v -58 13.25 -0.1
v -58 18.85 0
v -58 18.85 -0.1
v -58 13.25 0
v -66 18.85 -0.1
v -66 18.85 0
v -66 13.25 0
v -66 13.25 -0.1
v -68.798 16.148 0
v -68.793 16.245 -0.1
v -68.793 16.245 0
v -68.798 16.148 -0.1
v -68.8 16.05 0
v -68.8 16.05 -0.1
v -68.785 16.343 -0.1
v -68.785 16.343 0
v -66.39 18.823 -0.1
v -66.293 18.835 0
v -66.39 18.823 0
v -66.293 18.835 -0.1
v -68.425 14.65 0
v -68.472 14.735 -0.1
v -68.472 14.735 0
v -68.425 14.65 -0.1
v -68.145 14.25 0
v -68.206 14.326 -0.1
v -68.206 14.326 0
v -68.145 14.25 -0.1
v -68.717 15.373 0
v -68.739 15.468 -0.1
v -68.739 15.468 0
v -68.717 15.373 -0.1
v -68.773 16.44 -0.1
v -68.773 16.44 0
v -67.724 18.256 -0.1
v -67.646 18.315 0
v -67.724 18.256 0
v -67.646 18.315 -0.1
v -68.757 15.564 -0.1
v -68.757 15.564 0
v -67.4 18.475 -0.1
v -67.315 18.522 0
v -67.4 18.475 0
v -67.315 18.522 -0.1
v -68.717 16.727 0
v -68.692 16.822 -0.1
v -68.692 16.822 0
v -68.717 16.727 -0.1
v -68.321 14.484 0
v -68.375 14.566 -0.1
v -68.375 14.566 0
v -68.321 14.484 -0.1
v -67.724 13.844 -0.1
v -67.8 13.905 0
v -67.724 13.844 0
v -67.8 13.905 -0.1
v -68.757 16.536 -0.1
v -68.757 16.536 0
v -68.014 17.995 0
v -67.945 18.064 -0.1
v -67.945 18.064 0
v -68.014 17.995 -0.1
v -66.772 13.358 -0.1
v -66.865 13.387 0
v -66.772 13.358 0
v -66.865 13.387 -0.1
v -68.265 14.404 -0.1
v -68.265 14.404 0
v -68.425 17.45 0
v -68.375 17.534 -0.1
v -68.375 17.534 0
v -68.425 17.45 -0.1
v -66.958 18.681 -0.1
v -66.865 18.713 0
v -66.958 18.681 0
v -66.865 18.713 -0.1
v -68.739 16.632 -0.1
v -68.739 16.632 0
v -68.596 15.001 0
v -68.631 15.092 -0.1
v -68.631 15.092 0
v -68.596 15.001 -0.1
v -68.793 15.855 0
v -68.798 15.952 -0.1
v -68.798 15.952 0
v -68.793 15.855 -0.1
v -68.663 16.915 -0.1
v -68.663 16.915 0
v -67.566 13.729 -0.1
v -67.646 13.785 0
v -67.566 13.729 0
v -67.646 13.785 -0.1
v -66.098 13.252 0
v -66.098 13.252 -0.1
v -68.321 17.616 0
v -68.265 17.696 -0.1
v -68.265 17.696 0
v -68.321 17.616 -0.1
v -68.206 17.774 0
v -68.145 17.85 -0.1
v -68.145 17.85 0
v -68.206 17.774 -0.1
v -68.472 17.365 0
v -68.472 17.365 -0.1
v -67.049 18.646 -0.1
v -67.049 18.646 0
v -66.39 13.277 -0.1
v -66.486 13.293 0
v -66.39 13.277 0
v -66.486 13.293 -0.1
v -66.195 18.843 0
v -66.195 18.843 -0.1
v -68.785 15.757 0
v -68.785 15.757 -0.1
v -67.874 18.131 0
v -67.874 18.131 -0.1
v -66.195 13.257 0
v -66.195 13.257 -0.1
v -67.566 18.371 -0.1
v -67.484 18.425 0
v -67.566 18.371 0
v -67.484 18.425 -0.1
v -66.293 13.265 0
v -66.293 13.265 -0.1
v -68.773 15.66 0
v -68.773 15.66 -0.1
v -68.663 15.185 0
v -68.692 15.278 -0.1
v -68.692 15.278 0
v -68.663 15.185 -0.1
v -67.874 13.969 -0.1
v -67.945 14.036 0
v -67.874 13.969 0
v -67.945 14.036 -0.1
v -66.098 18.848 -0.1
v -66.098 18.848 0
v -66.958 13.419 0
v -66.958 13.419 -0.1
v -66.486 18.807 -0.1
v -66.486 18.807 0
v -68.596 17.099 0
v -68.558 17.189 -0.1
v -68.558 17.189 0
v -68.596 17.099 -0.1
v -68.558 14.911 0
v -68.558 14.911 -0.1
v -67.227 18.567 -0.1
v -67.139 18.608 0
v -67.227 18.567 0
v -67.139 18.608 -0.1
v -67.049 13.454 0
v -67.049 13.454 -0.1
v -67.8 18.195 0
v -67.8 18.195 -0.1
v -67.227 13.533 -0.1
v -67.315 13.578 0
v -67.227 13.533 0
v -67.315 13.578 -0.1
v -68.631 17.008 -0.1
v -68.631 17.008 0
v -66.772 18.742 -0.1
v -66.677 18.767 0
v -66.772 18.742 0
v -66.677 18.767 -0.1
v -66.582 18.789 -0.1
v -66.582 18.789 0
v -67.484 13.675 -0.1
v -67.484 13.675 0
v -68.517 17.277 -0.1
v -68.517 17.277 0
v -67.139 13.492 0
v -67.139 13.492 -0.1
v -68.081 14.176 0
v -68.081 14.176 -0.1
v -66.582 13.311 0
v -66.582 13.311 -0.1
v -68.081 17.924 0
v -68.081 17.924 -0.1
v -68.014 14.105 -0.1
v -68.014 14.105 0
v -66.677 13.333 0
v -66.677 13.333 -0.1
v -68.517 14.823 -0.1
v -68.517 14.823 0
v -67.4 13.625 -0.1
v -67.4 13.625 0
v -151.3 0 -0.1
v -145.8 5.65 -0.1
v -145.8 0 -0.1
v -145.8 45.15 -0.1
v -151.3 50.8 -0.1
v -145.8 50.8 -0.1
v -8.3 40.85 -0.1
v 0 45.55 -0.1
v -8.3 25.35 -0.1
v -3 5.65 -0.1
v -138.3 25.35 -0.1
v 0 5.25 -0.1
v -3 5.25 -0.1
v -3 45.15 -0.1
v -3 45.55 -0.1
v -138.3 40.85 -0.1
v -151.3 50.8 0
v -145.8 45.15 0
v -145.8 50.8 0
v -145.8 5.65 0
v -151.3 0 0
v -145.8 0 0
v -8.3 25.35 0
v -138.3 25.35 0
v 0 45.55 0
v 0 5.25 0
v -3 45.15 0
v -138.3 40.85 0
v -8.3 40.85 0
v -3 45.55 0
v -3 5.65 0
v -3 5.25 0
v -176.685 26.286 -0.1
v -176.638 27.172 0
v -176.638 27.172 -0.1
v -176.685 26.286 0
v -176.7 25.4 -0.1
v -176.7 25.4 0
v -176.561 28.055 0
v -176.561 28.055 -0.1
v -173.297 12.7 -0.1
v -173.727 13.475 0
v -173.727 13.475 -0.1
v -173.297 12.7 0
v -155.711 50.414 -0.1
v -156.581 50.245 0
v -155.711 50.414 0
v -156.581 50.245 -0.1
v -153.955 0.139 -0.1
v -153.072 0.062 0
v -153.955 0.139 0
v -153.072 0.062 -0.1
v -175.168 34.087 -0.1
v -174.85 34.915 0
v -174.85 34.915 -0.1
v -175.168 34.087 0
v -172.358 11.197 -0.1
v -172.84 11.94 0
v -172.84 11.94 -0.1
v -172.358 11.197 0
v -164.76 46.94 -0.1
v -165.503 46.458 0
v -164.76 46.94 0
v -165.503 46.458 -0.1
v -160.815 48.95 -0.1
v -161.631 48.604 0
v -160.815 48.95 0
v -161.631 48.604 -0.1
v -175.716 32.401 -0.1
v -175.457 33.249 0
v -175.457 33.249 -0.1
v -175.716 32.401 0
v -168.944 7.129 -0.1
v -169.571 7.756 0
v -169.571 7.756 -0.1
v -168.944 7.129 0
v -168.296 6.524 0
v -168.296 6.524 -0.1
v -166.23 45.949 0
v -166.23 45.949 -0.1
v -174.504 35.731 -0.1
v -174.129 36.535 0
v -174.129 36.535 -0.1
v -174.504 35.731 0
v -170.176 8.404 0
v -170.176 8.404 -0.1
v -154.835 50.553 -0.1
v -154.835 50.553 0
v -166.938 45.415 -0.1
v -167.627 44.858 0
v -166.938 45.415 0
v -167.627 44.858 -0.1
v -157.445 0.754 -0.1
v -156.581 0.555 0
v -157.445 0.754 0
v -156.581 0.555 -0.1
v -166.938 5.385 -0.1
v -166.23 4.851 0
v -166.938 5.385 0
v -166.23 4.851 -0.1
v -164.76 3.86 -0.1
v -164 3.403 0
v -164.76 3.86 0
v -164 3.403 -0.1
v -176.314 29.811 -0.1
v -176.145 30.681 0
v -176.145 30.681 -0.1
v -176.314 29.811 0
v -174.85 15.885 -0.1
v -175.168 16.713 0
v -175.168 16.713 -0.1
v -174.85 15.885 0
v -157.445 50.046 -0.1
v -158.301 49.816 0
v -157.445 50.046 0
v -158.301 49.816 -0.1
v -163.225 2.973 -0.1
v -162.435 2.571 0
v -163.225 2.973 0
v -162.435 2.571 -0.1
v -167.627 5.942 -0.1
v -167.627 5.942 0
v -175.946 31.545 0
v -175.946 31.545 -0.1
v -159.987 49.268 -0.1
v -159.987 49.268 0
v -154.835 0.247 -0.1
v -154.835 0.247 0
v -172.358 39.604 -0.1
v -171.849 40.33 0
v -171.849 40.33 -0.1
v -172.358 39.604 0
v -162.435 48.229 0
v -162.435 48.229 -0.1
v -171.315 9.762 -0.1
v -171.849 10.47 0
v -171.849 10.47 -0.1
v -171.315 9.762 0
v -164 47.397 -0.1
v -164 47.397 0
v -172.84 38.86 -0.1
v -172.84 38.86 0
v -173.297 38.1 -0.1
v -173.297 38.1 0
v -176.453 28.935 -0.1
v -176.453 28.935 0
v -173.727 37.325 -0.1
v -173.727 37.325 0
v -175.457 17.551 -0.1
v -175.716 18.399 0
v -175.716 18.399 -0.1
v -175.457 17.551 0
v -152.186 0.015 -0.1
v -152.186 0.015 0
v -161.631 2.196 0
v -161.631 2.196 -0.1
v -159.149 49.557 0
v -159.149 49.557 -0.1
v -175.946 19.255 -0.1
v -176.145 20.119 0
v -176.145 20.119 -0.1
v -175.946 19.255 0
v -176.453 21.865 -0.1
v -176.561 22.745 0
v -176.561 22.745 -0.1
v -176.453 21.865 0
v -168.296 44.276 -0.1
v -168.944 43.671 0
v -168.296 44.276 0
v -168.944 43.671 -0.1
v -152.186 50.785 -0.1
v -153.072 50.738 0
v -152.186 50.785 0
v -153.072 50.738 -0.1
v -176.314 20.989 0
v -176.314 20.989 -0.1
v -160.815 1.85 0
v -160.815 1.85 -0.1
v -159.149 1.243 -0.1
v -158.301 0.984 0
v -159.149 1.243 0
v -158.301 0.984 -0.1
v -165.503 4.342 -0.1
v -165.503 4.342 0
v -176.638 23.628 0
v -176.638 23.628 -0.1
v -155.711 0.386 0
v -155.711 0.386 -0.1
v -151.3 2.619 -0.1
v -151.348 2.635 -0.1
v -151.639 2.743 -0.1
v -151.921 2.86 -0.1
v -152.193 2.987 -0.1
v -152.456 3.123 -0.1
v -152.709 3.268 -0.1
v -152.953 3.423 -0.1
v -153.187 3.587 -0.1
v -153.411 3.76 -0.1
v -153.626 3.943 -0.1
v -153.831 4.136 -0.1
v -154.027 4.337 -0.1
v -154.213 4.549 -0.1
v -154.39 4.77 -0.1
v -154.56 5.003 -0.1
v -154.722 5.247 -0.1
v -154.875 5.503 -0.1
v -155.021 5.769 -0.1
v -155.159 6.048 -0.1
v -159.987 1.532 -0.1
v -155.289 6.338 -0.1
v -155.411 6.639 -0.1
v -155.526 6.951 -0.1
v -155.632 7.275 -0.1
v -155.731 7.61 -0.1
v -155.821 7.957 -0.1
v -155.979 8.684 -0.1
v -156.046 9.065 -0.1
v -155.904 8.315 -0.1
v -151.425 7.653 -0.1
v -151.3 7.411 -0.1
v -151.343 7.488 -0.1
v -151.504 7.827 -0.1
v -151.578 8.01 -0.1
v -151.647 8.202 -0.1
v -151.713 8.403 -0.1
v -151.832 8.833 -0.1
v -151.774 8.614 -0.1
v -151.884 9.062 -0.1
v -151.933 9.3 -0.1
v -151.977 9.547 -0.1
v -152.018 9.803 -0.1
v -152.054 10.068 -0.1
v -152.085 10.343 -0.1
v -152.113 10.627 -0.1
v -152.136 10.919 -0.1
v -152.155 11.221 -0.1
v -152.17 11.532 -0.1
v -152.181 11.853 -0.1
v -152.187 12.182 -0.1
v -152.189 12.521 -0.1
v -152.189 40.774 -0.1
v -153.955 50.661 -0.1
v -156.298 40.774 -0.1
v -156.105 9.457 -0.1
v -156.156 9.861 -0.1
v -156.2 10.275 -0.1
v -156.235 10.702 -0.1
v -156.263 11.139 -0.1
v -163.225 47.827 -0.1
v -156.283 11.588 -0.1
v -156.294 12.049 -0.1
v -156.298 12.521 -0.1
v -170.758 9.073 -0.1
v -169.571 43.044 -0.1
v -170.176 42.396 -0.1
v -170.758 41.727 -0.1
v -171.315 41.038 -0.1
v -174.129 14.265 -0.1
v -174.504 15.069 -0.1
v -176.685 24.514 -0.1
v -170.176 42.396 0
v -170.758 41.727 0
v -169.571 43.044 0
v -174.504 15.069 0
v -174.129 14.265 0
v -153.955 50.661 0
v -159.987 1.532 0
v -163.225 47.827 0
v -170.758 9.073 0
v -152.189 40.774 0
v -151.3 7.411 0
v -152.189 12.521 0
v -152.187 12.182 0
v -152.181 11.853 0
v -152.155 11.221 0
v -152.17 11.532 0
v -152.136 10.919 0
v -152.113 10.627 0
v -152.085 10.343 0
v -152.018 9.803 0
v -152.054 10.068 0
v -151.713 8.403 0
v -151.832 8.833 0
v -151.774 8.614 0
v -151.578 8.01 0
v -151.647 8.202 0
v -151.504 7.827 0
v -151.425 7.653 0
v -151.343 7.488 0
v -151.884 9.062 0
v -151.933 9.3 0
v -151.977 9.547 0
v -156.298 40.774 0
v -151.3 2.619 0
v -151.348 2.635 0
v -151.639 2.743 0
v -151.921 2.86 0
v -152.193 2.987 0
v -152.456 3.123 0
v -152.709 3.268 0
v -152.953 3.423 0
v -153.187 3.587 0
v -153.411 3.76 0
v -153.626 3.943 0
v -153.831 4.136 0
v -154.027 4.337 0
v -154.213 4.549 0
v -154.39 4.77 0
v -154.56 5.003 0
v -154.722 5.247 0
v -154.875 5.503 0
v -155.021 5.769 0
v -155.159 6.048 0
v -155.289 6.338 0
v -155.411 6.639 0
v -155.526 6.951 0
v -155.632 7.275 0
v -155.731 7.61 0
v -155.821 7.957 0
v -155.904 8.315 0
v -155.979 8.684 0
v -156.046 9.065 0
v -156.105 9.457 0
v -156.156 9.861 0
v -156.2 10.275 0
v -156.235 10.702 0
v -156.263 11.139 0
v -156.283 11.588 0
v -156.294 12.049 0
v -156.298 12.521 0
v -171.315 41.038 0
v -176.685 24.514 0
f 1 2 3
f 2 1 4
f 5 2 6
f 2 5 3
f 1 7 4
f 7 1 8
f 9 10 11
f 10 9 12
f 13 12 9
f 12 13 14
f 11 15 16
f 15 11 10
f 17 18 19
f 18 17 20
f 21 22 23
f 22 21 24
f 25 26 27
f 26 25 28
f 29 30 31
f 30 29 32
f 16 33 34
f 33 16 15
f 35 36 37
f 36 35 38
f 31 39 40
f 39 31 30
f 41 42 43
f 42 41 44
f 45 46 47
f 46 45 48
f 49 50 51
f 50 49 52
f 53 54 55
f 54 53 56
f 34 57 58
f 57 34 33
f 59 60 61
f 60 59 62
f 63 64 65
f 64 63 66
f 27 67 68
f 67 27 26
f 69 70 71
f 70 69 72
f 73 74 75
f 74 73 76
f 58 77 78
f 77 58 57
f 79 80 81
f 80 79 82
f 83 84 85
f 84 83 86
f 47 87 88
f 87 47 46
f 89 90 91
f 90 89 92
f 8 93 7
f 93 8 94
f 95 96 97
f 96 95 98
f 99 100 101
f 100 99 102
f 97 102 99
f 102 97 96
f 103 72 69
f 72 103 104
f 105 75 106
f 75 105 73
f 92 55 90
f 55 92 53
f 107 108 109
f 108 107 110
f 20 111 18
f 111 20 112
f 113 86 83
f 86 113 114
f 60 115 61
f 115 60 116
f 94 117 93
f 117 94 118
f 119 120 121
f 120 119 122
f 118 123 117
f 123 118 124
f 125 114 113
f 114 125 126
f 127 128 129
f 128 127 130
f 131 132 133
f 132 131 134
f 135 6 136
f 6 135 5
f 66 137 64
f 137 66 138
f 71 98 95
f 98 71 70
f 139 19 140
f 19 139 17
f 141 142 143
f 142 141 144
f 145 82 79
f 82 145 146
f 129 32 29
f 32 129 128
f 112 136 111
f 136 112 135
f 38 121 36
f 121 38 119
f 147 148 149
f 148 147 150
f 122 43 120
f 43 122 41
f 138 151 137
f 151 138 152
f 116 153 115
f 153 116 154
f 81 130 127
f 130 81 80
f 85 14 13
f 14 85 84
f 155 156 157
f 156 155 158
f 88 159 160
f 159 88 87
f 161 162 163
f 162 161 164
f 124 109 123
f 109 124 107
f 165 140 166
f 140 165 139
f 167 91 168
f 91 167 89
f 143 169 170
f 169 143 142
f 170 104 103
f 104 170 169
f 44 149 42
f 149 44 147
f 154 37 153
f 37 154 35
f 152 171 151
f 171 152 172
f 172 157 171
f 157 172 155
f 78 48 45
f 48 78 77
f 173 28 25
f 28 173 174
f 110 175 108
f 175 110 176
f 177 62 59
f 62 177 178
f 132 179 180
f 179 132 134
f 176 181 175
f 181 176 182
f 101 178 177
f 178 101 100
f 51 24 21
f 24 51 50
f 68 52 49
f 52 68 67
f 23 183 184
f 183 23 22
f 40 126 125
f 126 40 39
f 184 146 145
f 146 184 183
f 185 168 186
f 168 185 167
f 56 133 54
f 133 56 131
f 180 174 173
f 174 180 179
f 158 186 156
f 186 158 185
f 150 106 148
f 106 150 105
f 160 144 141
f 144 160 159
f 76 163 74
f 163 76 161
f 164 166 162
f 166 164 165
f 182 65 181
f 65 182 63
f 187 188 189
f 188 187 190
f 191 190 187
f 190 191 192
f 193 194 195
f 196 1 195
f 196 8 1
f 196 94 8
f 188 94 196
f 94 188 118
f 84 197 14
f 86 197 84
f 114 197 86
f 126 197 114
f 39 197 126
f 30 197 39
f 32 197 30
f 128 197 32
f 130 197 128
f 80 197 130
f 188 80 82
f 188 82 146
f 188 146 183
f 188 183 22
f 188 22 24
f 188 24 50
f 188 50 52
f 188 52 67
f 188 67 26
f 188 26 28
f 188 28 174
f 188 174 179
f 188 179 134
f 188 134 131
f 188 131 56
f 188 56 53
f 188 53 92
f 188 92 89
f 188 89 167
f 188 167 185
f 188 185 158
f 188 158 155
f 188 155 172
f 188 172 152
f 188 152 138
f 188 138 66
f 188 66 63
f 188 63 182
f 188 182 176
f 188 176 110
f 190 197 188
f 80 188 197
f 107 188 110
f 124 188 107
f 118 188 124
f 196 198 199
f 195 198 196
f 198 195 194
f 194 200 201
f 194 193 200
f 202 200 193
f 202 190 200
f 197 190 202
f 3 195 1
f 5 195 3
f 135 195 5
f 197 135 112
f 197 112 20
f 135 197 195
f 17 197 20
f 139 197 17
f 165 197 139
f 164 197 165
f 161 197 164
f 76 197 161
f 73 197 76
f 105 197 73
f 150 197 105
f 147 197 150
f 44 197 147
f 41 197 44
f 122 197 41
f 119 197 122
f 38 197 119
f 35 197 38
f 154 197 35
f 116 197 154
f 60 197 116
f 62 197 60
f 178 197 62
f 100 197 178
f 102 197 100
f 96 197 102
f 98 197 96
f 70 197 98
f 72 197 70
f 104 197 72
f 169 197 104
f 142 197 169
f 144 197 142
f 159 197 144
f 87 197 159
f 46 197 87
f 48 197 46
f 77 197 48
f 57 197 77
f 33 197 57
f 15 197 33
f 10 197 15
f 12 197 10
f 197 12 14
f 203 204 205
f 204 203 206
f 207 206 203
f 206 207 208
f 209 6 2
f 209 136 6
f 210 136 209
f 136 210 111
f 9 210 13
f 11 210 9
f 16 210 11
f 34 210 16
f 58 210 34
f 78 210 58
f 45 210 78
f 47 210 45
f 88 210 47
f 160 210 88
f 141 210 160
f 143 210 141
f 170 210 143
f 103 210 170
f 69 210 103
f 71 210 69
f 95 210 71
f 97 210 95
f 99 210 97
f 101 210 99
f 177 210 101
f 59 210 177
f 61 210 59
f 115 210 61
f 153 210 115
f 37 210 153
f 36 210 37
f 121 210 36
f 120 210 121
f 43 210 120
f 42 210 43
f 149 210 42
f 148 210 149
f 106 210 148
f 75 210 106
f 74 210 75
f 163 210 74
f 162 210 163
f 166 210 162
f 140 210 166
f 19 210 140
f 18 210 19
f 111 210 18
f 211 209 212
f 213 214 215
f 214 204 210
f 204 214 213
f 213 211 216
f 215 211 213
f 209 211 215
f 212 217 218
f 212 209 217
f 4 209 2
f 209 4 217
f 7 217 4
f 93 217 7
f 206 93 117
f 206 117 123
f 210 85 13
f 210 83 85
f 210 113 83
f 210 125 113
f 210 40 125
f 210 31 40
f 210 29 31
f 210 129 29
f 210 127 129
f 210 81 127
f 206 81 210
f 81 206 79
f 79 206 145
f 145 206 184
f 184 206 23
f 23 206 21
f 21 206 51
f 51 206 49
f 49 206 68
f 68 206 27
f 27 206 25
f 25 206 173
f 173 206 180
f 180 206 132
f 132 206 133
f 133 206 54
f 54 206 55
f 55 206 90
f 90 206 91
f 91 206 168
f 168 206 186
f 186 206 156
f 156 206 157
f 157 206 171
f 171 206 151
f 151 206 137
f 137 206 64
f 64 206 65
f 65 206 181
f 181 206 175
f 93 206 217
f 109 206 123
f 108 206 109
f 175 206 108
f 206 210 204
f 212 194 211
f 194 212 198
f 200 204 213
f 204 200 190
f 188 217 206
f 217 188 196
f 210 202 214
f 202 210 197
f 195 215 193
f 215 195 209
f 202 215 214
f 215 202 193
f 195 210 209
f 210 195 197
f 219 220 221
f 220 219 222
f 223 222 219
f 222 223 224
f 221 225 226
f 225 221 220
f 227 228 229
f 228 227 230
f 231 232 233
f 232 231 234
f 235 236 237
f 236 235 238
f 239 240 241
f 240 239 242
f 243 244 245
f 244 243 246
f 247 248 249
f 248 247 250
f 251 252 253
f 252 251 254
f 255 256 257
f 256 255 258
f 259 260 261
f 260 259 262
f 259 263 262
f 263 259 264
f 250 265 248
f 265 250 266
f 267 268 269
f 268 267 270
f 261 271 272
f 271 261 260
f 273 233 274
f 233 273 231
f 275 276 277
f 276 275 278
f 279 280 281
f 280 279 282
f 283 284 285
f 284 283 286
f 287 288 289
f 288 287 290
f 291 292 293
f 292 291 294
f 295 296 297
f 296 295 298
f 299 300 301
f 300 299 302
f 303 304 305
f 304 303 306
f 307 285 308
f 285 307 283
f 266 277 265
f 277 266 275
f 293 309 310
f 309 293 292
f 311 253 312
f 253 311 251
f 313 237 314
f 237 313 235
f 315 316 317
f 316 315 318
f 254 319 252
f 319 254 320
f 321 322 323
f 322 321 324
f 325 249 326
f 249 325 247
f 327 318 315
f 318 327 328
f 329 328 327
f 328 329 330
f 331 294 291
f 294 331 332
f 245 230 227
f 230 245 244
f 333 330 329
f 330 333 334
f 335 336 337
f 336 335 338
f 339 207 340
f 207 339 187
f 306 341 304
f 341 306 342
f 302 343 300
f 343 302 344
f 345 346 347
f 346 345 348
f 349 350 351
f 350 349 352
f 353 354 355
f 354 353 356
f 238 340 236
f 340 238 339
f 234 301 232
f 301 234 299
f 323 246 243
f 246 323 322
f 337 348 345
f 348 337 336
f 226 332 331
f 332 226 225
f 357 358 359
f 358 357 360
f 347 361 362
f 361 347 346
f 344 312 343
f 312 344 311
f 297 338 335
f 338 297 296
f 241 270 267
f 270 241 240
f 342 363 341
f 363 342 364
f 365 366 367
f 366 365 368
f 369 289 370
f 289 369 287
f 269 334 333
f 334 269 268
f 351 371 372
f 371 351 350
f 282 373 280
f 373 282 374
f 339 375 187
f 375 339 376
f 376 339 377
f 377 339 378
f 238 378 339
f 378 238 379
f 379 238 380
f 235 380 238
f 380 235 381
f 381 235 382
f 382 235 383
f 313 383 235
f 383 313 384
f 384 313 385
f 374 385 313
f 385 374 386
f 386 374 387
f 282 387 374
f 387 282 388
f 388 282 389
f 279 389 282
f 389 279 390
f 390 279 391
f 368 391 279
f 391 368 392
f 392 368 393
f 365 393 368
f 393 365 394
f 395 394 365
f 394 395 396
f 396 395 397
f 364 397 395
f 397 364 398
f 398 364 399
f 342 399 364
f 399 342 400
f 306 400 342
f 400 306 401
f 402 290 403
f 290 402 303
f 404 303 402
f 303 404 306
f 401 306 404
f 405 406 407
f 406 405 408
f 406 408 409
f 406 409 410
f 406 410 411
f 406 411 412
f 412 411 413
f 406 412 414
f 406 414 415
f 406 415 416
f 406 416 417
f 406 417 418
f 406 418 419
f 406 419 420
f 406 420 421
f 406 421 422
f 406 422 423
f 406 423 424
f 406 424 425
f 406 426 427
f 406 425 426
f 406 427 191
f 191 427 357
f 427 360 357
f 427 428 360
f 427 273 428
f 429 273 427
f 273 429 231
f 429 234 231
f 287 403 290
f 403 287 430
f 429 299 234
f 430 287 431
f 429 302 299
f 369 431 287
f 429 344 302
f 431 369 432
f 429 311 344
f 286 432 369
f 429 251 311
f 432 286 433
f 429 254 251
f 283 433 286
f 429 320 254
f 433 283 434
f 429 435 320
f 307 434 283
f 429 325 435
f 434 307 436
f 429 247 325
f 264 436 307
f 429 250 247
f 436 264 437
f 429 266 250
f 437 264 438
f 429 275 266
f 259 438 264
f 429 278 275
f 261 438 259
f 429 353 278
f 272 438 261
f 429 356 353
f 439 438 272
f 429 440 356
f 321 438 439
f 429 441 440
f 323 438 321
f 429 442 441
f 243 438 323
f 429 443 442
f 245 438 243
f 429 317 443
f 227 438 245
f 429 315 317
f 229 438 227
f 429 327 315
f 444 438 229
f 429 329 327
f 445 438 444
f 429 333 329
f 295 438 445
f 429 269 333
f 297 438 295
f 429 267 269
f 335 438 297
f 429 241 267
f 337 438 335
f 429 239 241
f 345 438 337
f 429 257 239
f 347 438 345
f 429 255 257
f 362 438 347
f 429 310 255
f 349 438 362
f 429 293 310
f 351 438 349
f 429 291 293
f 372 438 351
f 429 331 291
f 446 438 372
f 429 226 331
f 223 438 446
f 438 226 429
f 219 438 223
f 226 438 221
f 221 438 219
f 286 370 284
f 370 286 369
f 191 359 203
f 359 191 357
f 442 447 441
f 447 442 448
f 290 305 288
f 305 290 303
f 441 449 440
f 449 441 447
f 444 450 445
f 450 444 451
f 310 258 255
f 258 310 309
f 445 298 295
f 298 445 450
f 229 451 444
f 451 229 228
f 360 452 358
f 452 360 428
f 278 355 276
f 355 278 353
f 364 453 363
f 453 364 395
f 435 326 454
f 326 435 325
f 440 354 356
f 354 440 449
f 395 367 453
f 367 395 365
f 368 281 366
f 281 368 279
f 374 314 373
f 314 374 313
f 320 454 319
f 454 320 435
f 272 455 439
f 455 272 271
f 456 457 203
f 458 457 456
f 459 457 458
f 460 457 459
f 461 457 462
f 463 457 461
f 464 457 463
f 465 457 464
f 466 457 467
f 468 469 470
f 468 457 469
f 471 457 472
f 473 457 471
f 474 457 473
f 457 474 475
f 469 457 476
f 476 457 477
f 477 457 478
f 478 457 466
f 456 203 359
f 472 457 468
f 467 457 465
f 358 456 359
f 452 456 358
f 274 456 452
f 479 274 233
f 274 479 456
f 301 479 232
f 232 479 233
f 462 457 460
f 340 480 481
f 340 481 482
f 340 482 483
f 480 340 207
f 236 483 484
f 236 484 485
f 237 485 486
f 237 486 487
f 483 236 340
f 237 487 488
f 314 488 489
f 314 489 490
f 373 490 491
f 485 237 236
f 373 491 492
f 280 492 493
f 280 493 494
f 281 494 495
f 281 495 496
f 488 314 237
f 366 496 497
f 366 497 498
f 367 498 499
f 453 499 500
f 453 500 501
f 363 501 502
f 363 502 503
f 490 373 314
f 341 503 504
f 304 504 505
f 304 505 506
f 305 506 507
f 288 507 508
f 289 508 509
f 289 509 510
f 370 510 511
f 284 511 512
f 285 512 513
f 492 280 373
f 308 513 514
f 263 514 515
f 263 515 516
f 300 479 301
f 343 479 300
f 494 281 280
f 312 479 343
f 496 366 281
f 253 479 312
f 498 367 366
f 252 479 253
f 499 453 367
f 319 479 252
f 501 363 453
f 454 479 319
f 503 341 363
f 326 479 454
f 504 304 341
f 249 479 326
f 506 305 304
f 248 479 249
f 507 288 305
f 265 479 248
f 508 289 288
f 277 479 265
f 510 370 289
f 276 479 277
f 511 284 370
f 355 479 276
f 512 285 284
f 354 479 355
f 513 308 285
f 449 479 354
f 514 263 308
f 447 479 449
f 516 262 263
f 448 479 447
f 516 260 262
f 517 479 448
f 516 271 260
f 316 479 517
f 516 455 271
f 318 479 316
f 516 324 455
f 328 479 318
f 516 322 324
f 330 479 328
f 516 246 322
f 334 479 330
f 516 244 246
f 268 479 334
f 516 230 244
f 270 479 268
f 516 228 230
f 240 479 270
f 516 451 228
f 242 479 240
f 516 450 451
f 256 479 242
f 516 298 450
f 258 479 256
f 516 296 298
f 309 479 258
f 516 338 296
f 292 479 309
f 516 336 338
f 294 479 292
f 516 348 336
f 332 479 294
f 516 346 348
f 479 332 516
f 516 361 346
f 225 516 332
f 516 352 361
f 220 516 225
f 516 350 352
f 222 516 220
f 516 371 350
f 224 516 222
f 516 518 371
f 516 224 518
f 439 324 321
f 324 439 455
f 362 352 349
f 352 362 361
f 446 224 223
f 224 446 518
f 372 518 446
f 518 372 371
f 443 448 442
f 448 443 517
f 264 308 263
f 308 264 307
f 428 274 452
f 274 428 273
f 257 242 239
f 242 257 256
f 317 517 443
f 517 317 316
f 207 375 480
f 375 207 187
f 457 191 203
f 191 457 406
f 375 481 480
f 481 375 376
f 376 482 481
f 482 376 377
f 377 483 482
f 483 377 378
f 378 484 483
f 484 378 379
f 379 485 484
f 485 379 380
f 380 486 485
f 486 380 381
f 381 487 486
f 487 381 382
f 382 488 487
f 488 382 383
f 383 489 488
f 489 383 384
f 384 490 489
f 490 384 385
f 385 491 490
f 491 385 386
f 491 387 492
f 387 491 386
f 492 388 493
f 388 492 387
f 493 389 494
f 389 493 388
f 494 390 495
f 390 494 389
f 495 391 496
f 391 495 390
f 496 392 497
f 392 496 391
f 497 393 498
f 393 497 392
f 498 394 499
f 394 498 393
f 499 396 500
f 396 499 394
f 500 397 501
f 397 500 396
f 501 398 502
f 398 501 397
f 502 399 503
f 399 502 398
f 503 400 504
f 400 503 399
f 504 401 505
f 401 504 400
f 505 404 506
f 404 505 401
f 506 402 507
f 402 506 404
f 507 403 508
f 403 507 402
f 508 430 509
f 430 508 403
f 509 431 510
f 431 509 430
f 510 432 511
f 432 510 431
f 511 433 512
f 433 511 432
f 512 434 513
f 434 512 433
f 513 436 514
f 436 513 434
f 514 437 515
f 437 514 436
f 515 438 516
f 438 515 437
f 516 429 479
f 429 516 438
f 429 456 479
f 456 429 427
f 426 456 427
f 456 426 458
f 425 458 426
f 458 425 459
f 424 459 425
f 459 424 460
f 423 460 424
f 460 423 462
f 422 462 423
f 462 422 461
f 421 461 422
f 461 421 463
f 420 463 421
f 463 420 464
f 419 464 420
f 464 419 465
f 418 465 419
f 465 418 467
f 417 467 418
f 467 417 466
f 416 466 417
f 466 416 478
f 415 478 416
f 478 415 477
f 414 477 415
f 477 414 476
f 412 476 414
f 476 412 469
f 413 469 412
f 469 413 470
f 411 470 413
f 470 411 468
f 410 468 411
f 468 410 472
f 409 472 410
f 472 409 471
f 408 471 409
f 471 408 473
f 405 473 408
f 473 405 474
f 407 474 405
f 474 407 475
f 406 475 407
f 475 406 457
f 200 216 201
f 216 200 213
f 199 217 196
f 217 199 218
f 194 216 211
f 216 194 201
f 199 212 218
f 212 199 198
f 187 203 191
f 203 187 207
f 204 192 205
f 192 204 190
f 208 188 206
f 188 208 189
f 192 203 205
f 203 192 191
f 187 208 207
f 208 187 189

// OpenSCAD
$fn = 180;
x = 40; y = 146; z = 169; d = 5.5; n = 6; R=12.5; H=0.1;
rotate([0,180,0]){
translate([0,5.65,0]){union()
    translate([0,-0.4,0]) cube([3,40.3,H]);
    {difference(){cube([y,39.5,H]);
    translate([58,7.6,-0.1]) union(){cube([8,5.6,3*H]);
    translate([8,2.8,0]) cylinder(h=3*H, r=2.8);}
    translate([8.3,19.7,-H]) cube([130,15.5,3*H]);}
    translate([y-0.2,-5.65,0]) cube([d,50.8,H]);
  translate([y-0.2+d,19.75,0])difference(){{cylinder(h=H,r=25.4);
  translate([-26,-30,-H]) cube([26,60,3*H]);}
  translate([-3.2,-15,0]) linear_extrude(height = 10) text("J", font="Wingdings 2", size=30);
  }
    }}
    
}
